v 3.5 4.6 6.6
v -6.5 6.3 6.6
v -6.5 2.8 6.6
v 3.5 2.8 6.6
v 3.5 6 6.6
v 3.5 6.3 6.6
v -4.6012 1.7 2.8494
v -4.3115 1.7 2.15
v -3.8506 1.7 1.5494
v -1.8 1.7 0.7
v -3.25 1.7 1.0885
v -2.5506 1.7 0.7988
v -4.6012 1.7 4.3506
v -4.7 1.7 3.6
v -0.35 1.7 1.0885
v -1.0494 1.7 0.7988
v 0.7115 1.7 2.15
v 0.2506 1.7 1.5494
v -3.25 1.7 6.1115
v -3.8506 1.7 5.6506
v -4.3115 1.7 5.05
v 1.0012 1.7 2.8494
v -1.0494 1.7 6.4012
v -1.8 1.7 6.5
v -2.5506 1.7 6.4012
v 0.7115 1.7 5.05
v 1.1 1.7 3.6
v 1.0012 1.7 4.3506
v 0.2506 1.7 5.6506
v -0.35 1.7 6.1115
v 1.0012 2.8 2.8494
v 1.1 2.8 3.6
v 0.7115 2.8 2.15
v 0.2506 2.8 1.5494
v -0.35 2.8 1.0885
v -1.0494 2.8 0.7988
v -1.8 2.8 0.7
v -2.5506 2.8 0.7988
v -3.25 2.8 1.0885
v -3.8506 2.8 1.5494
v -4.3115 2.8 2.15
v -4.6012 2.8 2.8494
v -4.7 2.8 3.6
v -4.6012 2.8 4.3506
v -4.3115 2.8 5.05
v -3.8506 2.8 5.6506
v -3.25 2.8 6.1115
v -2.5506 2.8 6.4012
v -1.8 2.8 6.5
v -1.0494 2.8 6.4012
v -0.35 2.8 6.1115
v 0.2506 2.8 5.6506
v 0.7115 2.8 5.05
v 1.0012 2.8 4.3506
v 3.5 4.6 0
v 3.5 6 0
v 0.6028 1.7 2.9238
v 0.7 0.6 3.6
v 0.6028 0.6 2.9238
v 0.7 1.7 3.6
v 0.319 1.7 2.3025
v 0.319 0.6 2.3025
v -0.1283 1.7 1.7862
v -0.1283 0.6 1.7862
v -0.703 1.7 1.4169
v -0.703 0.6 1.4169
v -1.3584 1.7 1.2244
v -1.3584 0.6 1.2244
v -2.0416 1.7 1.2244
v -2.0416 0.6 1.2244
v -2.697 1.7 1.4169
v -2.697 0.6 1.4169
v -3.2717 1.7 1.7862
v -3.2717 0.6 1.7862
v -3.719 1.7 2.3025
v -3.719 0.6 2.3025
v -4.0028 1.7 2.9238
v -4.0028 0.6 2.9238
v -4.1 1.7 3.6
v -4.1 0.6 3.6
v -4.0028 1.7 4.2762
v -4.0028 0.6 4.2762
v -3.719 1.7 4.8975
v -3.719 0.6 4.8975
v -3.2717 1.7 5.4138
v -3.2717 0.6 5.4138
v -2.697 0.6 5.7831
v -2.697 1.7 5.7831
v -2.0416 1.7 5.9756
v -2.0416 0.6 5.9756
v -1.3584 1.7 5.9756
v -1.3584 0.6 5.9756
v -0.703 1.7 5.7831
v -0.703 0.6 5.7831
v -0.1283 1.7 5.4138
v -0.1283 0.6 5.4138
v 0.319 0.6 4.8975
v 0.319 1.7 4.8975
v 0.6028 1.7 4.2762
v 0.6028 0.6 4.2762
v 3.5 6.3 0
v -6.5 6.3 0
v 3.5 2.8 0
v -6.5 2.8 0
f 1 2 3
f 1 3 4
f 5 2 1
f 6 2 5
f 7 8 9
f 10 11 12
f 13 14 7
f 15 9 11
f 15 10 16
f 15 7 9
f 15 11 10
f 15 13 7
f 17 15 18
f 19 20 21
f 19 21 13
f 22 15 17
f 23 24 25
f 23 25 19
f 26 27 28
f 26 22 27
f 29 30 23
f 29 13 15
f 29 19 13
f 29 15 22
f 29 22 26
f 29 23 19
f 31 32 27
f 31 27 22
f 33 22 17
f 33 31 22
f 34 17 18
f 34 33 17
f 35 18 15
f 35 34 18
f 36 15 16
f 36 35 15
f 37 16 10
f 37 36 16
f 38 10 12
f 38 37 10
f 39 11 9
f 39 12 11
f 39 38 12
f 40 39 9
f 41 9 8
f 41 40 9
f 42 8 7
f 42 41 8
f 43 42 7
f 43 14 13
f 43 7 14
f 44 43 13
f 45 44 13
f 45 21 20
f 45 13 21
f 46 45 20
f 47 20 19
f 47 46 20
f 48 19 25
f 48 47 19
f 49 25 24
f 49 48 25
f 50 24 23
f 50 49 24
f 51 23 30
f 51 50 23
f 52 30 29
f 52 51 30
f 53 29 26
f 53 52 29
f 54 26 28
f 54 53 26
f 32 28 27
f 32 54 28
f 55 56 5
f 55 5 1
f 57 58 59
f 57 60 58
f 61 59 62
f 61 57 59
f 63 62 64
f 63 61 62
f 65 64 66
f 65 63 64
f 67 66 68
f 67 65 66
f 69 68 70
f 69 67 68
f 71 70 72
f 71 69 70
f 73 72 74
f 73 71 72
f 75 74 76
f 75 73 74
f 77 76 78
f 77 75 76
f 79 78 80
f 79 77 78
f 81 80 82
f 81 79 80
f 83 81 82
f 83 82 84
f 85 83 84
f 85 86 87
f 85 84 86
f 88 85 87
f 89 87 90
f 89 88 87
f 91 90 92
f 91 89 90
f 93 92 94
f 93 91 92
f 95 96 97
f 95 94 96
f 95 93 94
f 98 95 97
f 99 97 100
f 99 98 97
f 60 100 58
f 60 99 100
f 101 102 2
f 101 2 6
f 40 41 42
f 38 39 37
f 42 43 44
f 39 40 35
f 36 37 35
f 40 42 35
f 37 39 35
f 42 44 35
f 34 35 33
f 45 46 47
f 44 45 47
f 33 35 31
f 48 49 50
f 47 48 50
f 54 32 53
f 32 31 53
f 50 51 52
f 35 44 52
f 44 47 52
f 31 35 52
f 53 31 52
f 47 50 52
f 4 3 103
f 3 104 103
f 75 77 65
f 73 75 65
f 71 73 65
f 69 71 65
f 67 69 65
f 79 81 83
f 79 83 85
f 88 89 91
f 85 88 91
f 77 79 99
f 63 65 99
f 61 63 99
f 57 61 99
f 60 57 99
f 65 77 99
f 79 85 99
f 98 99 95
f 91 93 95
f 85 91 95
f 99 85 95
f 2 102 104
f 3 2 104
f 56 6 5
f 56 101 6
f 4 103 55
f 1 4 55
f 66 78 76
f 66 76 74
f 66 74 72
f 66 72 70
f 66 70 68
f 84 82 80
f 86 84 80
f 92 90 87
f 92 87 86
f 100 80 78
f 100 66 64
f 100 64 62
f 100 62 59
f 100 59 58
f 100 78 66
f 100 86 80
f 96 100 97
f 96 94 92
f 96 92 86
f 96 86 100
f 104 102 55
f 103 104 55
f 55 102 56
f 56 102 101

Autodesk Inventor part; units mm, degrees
ref_plane "Work Plane1" through (0, 0, 0) normal (0, 0, 1) x (1, 0, 0)
sketch "Sketch1" plane through (0, 0, 0) normal (0, 0, 1) x (1, 0, 0)
  line L0 (-6.5, 6.3) -> (3.5, 6.3)
  line L1 (3.5, 6.3) -> (3.5, 6)
  line L2 (3.5, 6) -> (3.5, 4.6)
  line L3 (3.5, 2.8) -> (3.5, 4.6)
  line L4 (-6.5, 2.8) -> (3.5, 2.8)
  line L5 (-6.5, 6.3) -> (-6.5, 2.8)
extrude "Extrusion1" add sketch "Sketch1" along normal blind 6.6
ref_plane "Work Plane2" through (-1.5, 2.8, 3.3) normal (0, -1, 0) x (1, 0, 0)
sketch "Sketch2" plane through (-1.5, 2.8, 3.3) normal (0, -1, 0) x (1, 0, 0)
  circle A0 centre (-0.3, 0.3) radius 2.9
extrude "Extrusion2" add sketch "Sketch2" along normal blind 1.1 separate body
ref_plane "Work Plane3" through (-1.7, 1.7, 3.6) normal (0, -1, 0) x (1, 0, 0)
sketch "Sketch3" plane through (-1.7, 1.7, 3.6) normal (0, -1, 0) x (1, 0, 0)
  circle A0 centre (0, 0) radius 2.4
extrude "Extrusion3" add sketch "Sketch3" along normal blind 1.1 separate body
properties part number "test_two_sketch_planes_cad_model"
